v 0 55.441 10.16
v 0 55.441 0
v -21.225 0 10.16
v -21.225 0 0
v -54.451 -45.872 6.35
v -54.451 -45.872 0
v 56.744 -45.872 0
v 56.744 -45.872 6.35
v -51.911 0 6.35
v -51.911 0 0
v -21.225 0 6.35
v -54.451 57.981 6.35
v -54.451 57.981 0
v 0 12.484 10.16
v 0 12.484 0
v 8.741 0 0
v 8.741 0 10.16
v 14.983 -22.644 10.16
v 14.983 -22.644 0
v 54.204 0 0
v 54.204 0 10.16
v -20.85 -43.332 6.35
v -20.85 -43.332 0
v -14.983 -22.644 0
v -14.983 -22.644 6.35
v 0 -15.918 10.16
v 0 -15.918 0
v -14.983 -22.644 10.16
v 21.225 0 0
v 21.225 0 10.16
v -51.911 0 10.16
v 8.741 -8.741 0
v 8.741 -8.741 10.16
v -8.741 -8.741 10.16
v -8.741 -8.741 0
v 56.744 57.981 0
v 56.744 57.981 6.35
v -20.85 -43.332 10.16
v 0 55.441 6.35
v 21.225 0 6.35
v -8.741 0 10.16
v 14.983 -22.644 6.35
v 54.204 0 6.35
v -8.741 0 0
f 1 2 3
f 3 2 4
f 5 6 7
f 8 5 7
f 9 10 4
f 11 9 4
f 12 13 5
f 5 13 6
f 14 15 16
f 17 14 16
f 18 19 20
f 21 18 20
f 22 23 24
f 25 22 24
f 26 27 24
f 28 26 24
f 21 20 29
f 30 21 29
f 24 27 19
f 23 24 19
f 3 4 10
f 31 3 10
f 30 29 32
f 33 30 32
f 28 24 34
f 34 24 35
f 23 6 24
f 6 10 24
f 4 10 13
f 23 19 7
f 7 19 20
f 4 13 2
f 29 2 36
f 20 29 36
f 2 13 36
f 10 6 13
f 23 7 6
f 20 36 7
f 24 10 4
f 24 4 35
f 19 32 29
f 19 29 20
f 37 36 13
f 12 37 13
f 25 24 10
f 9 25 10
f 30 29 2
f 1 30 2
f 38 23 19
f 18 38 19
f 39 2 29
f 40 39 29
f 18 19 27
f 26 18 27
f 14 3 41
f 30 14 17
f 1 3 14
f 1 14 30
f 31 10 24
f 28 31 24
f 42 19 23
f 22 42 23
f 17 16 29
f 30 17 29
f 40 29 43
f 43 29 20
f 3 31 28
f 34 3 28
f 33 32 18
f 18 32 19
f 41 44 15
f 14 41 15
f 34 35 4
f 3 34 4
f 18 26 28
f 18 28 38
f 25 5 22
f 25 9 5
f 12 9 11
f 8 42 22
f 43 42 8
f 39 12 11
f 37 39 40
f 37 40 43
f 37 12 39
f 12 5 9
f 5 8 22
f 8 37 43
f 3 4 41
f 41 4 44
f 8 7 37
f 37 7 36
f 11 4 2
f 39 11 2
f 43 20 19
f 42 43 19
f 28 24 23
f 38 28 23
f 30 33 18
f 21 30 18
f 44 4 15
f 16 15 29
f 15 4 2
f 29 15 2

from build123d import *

# Parameters (mm, degrees)
F1_DEPTH = 6.35
F2_DEPTH = 10.16


# Not quite as in the source:
# - a feature names something its author has since deleted; it is built from what else it names


with BuildPart() as f1:
    # F0 (on Top) → F1 (new body)
    with BuildSketch(Plane.XY):
        Polygon((56.7444791493, 57.9814615035), (-51.9109388844, 57.9814615035), (-54.4509388844, 57.9814615035), (-54.4509388844, -45.8724710478), (-51.9109388844, -45.8724710478), (56.7444791493, -45.8724710478), align=None)
        Polygon((-51.9109388844, 0), (-21.225182045, 0), (0, 55.4414615035), (21.225182045, 0), (54.2044791493, 0), (14.9832434675, -22.6443909789), (-20.8495623229, -43.3324710478), (-14.9832434675, -22.6443909789), align=None, mode=Mode.SUBTRACT)
    extrude(amount=F1_DEPTH)


with BuildPart() as f2:
    # F0 (on Top) → F2 (new body)
    with BuildSketch(Plane.XY):
        Polygon((-8.74130489, 0), (0, 12.483877155), (8.74130489, 0), (21.225182045, 0), (0, 55.4414615035), (-21.225182045, 0), align=None)
    extrude(amount=F2_DEPTH)


with BuildPart() as f2b:
    # F0 (on Top) → F2, piece 2 (new body)
    with BuildSketch(Plane.XY):
        Polygon((-8.74130489, -8.74130489), (-21.225182045, 0), (-51.9109388844, 0), (-14.9832434675, -22.6443909789), align=None)
    extrude(amount=F2_DEPTH)


with BuildPart() as f2c:
    # F0 (on Top) → F2, piece 3 (new body)
    with BuildSketch(Plane.XY):
        Polygon((0, -15.9175042418), (-14.9832434675, -22.6443909789), (-20.8495623229, -43.3324710478), (14.9832434675, -22.6443909789), align=None)
    extrude(amount=F2_DEPTH)


with BuildPart() as f2d:
    # F0 (on Top) → F2, piece 4 (new body)
    with BuildSketch(Plane.XY):
        Polygon((54.2044791493, 0), (21.225182045, 0), (8.74130489, -8.74130489), (14.9832434675, -22.6443909789), align=None)
    extrude(amount=F2_DEPTH)


solid = Compound([f1.part, f2.part, f2b.part, f2c.part, f2d.part])
